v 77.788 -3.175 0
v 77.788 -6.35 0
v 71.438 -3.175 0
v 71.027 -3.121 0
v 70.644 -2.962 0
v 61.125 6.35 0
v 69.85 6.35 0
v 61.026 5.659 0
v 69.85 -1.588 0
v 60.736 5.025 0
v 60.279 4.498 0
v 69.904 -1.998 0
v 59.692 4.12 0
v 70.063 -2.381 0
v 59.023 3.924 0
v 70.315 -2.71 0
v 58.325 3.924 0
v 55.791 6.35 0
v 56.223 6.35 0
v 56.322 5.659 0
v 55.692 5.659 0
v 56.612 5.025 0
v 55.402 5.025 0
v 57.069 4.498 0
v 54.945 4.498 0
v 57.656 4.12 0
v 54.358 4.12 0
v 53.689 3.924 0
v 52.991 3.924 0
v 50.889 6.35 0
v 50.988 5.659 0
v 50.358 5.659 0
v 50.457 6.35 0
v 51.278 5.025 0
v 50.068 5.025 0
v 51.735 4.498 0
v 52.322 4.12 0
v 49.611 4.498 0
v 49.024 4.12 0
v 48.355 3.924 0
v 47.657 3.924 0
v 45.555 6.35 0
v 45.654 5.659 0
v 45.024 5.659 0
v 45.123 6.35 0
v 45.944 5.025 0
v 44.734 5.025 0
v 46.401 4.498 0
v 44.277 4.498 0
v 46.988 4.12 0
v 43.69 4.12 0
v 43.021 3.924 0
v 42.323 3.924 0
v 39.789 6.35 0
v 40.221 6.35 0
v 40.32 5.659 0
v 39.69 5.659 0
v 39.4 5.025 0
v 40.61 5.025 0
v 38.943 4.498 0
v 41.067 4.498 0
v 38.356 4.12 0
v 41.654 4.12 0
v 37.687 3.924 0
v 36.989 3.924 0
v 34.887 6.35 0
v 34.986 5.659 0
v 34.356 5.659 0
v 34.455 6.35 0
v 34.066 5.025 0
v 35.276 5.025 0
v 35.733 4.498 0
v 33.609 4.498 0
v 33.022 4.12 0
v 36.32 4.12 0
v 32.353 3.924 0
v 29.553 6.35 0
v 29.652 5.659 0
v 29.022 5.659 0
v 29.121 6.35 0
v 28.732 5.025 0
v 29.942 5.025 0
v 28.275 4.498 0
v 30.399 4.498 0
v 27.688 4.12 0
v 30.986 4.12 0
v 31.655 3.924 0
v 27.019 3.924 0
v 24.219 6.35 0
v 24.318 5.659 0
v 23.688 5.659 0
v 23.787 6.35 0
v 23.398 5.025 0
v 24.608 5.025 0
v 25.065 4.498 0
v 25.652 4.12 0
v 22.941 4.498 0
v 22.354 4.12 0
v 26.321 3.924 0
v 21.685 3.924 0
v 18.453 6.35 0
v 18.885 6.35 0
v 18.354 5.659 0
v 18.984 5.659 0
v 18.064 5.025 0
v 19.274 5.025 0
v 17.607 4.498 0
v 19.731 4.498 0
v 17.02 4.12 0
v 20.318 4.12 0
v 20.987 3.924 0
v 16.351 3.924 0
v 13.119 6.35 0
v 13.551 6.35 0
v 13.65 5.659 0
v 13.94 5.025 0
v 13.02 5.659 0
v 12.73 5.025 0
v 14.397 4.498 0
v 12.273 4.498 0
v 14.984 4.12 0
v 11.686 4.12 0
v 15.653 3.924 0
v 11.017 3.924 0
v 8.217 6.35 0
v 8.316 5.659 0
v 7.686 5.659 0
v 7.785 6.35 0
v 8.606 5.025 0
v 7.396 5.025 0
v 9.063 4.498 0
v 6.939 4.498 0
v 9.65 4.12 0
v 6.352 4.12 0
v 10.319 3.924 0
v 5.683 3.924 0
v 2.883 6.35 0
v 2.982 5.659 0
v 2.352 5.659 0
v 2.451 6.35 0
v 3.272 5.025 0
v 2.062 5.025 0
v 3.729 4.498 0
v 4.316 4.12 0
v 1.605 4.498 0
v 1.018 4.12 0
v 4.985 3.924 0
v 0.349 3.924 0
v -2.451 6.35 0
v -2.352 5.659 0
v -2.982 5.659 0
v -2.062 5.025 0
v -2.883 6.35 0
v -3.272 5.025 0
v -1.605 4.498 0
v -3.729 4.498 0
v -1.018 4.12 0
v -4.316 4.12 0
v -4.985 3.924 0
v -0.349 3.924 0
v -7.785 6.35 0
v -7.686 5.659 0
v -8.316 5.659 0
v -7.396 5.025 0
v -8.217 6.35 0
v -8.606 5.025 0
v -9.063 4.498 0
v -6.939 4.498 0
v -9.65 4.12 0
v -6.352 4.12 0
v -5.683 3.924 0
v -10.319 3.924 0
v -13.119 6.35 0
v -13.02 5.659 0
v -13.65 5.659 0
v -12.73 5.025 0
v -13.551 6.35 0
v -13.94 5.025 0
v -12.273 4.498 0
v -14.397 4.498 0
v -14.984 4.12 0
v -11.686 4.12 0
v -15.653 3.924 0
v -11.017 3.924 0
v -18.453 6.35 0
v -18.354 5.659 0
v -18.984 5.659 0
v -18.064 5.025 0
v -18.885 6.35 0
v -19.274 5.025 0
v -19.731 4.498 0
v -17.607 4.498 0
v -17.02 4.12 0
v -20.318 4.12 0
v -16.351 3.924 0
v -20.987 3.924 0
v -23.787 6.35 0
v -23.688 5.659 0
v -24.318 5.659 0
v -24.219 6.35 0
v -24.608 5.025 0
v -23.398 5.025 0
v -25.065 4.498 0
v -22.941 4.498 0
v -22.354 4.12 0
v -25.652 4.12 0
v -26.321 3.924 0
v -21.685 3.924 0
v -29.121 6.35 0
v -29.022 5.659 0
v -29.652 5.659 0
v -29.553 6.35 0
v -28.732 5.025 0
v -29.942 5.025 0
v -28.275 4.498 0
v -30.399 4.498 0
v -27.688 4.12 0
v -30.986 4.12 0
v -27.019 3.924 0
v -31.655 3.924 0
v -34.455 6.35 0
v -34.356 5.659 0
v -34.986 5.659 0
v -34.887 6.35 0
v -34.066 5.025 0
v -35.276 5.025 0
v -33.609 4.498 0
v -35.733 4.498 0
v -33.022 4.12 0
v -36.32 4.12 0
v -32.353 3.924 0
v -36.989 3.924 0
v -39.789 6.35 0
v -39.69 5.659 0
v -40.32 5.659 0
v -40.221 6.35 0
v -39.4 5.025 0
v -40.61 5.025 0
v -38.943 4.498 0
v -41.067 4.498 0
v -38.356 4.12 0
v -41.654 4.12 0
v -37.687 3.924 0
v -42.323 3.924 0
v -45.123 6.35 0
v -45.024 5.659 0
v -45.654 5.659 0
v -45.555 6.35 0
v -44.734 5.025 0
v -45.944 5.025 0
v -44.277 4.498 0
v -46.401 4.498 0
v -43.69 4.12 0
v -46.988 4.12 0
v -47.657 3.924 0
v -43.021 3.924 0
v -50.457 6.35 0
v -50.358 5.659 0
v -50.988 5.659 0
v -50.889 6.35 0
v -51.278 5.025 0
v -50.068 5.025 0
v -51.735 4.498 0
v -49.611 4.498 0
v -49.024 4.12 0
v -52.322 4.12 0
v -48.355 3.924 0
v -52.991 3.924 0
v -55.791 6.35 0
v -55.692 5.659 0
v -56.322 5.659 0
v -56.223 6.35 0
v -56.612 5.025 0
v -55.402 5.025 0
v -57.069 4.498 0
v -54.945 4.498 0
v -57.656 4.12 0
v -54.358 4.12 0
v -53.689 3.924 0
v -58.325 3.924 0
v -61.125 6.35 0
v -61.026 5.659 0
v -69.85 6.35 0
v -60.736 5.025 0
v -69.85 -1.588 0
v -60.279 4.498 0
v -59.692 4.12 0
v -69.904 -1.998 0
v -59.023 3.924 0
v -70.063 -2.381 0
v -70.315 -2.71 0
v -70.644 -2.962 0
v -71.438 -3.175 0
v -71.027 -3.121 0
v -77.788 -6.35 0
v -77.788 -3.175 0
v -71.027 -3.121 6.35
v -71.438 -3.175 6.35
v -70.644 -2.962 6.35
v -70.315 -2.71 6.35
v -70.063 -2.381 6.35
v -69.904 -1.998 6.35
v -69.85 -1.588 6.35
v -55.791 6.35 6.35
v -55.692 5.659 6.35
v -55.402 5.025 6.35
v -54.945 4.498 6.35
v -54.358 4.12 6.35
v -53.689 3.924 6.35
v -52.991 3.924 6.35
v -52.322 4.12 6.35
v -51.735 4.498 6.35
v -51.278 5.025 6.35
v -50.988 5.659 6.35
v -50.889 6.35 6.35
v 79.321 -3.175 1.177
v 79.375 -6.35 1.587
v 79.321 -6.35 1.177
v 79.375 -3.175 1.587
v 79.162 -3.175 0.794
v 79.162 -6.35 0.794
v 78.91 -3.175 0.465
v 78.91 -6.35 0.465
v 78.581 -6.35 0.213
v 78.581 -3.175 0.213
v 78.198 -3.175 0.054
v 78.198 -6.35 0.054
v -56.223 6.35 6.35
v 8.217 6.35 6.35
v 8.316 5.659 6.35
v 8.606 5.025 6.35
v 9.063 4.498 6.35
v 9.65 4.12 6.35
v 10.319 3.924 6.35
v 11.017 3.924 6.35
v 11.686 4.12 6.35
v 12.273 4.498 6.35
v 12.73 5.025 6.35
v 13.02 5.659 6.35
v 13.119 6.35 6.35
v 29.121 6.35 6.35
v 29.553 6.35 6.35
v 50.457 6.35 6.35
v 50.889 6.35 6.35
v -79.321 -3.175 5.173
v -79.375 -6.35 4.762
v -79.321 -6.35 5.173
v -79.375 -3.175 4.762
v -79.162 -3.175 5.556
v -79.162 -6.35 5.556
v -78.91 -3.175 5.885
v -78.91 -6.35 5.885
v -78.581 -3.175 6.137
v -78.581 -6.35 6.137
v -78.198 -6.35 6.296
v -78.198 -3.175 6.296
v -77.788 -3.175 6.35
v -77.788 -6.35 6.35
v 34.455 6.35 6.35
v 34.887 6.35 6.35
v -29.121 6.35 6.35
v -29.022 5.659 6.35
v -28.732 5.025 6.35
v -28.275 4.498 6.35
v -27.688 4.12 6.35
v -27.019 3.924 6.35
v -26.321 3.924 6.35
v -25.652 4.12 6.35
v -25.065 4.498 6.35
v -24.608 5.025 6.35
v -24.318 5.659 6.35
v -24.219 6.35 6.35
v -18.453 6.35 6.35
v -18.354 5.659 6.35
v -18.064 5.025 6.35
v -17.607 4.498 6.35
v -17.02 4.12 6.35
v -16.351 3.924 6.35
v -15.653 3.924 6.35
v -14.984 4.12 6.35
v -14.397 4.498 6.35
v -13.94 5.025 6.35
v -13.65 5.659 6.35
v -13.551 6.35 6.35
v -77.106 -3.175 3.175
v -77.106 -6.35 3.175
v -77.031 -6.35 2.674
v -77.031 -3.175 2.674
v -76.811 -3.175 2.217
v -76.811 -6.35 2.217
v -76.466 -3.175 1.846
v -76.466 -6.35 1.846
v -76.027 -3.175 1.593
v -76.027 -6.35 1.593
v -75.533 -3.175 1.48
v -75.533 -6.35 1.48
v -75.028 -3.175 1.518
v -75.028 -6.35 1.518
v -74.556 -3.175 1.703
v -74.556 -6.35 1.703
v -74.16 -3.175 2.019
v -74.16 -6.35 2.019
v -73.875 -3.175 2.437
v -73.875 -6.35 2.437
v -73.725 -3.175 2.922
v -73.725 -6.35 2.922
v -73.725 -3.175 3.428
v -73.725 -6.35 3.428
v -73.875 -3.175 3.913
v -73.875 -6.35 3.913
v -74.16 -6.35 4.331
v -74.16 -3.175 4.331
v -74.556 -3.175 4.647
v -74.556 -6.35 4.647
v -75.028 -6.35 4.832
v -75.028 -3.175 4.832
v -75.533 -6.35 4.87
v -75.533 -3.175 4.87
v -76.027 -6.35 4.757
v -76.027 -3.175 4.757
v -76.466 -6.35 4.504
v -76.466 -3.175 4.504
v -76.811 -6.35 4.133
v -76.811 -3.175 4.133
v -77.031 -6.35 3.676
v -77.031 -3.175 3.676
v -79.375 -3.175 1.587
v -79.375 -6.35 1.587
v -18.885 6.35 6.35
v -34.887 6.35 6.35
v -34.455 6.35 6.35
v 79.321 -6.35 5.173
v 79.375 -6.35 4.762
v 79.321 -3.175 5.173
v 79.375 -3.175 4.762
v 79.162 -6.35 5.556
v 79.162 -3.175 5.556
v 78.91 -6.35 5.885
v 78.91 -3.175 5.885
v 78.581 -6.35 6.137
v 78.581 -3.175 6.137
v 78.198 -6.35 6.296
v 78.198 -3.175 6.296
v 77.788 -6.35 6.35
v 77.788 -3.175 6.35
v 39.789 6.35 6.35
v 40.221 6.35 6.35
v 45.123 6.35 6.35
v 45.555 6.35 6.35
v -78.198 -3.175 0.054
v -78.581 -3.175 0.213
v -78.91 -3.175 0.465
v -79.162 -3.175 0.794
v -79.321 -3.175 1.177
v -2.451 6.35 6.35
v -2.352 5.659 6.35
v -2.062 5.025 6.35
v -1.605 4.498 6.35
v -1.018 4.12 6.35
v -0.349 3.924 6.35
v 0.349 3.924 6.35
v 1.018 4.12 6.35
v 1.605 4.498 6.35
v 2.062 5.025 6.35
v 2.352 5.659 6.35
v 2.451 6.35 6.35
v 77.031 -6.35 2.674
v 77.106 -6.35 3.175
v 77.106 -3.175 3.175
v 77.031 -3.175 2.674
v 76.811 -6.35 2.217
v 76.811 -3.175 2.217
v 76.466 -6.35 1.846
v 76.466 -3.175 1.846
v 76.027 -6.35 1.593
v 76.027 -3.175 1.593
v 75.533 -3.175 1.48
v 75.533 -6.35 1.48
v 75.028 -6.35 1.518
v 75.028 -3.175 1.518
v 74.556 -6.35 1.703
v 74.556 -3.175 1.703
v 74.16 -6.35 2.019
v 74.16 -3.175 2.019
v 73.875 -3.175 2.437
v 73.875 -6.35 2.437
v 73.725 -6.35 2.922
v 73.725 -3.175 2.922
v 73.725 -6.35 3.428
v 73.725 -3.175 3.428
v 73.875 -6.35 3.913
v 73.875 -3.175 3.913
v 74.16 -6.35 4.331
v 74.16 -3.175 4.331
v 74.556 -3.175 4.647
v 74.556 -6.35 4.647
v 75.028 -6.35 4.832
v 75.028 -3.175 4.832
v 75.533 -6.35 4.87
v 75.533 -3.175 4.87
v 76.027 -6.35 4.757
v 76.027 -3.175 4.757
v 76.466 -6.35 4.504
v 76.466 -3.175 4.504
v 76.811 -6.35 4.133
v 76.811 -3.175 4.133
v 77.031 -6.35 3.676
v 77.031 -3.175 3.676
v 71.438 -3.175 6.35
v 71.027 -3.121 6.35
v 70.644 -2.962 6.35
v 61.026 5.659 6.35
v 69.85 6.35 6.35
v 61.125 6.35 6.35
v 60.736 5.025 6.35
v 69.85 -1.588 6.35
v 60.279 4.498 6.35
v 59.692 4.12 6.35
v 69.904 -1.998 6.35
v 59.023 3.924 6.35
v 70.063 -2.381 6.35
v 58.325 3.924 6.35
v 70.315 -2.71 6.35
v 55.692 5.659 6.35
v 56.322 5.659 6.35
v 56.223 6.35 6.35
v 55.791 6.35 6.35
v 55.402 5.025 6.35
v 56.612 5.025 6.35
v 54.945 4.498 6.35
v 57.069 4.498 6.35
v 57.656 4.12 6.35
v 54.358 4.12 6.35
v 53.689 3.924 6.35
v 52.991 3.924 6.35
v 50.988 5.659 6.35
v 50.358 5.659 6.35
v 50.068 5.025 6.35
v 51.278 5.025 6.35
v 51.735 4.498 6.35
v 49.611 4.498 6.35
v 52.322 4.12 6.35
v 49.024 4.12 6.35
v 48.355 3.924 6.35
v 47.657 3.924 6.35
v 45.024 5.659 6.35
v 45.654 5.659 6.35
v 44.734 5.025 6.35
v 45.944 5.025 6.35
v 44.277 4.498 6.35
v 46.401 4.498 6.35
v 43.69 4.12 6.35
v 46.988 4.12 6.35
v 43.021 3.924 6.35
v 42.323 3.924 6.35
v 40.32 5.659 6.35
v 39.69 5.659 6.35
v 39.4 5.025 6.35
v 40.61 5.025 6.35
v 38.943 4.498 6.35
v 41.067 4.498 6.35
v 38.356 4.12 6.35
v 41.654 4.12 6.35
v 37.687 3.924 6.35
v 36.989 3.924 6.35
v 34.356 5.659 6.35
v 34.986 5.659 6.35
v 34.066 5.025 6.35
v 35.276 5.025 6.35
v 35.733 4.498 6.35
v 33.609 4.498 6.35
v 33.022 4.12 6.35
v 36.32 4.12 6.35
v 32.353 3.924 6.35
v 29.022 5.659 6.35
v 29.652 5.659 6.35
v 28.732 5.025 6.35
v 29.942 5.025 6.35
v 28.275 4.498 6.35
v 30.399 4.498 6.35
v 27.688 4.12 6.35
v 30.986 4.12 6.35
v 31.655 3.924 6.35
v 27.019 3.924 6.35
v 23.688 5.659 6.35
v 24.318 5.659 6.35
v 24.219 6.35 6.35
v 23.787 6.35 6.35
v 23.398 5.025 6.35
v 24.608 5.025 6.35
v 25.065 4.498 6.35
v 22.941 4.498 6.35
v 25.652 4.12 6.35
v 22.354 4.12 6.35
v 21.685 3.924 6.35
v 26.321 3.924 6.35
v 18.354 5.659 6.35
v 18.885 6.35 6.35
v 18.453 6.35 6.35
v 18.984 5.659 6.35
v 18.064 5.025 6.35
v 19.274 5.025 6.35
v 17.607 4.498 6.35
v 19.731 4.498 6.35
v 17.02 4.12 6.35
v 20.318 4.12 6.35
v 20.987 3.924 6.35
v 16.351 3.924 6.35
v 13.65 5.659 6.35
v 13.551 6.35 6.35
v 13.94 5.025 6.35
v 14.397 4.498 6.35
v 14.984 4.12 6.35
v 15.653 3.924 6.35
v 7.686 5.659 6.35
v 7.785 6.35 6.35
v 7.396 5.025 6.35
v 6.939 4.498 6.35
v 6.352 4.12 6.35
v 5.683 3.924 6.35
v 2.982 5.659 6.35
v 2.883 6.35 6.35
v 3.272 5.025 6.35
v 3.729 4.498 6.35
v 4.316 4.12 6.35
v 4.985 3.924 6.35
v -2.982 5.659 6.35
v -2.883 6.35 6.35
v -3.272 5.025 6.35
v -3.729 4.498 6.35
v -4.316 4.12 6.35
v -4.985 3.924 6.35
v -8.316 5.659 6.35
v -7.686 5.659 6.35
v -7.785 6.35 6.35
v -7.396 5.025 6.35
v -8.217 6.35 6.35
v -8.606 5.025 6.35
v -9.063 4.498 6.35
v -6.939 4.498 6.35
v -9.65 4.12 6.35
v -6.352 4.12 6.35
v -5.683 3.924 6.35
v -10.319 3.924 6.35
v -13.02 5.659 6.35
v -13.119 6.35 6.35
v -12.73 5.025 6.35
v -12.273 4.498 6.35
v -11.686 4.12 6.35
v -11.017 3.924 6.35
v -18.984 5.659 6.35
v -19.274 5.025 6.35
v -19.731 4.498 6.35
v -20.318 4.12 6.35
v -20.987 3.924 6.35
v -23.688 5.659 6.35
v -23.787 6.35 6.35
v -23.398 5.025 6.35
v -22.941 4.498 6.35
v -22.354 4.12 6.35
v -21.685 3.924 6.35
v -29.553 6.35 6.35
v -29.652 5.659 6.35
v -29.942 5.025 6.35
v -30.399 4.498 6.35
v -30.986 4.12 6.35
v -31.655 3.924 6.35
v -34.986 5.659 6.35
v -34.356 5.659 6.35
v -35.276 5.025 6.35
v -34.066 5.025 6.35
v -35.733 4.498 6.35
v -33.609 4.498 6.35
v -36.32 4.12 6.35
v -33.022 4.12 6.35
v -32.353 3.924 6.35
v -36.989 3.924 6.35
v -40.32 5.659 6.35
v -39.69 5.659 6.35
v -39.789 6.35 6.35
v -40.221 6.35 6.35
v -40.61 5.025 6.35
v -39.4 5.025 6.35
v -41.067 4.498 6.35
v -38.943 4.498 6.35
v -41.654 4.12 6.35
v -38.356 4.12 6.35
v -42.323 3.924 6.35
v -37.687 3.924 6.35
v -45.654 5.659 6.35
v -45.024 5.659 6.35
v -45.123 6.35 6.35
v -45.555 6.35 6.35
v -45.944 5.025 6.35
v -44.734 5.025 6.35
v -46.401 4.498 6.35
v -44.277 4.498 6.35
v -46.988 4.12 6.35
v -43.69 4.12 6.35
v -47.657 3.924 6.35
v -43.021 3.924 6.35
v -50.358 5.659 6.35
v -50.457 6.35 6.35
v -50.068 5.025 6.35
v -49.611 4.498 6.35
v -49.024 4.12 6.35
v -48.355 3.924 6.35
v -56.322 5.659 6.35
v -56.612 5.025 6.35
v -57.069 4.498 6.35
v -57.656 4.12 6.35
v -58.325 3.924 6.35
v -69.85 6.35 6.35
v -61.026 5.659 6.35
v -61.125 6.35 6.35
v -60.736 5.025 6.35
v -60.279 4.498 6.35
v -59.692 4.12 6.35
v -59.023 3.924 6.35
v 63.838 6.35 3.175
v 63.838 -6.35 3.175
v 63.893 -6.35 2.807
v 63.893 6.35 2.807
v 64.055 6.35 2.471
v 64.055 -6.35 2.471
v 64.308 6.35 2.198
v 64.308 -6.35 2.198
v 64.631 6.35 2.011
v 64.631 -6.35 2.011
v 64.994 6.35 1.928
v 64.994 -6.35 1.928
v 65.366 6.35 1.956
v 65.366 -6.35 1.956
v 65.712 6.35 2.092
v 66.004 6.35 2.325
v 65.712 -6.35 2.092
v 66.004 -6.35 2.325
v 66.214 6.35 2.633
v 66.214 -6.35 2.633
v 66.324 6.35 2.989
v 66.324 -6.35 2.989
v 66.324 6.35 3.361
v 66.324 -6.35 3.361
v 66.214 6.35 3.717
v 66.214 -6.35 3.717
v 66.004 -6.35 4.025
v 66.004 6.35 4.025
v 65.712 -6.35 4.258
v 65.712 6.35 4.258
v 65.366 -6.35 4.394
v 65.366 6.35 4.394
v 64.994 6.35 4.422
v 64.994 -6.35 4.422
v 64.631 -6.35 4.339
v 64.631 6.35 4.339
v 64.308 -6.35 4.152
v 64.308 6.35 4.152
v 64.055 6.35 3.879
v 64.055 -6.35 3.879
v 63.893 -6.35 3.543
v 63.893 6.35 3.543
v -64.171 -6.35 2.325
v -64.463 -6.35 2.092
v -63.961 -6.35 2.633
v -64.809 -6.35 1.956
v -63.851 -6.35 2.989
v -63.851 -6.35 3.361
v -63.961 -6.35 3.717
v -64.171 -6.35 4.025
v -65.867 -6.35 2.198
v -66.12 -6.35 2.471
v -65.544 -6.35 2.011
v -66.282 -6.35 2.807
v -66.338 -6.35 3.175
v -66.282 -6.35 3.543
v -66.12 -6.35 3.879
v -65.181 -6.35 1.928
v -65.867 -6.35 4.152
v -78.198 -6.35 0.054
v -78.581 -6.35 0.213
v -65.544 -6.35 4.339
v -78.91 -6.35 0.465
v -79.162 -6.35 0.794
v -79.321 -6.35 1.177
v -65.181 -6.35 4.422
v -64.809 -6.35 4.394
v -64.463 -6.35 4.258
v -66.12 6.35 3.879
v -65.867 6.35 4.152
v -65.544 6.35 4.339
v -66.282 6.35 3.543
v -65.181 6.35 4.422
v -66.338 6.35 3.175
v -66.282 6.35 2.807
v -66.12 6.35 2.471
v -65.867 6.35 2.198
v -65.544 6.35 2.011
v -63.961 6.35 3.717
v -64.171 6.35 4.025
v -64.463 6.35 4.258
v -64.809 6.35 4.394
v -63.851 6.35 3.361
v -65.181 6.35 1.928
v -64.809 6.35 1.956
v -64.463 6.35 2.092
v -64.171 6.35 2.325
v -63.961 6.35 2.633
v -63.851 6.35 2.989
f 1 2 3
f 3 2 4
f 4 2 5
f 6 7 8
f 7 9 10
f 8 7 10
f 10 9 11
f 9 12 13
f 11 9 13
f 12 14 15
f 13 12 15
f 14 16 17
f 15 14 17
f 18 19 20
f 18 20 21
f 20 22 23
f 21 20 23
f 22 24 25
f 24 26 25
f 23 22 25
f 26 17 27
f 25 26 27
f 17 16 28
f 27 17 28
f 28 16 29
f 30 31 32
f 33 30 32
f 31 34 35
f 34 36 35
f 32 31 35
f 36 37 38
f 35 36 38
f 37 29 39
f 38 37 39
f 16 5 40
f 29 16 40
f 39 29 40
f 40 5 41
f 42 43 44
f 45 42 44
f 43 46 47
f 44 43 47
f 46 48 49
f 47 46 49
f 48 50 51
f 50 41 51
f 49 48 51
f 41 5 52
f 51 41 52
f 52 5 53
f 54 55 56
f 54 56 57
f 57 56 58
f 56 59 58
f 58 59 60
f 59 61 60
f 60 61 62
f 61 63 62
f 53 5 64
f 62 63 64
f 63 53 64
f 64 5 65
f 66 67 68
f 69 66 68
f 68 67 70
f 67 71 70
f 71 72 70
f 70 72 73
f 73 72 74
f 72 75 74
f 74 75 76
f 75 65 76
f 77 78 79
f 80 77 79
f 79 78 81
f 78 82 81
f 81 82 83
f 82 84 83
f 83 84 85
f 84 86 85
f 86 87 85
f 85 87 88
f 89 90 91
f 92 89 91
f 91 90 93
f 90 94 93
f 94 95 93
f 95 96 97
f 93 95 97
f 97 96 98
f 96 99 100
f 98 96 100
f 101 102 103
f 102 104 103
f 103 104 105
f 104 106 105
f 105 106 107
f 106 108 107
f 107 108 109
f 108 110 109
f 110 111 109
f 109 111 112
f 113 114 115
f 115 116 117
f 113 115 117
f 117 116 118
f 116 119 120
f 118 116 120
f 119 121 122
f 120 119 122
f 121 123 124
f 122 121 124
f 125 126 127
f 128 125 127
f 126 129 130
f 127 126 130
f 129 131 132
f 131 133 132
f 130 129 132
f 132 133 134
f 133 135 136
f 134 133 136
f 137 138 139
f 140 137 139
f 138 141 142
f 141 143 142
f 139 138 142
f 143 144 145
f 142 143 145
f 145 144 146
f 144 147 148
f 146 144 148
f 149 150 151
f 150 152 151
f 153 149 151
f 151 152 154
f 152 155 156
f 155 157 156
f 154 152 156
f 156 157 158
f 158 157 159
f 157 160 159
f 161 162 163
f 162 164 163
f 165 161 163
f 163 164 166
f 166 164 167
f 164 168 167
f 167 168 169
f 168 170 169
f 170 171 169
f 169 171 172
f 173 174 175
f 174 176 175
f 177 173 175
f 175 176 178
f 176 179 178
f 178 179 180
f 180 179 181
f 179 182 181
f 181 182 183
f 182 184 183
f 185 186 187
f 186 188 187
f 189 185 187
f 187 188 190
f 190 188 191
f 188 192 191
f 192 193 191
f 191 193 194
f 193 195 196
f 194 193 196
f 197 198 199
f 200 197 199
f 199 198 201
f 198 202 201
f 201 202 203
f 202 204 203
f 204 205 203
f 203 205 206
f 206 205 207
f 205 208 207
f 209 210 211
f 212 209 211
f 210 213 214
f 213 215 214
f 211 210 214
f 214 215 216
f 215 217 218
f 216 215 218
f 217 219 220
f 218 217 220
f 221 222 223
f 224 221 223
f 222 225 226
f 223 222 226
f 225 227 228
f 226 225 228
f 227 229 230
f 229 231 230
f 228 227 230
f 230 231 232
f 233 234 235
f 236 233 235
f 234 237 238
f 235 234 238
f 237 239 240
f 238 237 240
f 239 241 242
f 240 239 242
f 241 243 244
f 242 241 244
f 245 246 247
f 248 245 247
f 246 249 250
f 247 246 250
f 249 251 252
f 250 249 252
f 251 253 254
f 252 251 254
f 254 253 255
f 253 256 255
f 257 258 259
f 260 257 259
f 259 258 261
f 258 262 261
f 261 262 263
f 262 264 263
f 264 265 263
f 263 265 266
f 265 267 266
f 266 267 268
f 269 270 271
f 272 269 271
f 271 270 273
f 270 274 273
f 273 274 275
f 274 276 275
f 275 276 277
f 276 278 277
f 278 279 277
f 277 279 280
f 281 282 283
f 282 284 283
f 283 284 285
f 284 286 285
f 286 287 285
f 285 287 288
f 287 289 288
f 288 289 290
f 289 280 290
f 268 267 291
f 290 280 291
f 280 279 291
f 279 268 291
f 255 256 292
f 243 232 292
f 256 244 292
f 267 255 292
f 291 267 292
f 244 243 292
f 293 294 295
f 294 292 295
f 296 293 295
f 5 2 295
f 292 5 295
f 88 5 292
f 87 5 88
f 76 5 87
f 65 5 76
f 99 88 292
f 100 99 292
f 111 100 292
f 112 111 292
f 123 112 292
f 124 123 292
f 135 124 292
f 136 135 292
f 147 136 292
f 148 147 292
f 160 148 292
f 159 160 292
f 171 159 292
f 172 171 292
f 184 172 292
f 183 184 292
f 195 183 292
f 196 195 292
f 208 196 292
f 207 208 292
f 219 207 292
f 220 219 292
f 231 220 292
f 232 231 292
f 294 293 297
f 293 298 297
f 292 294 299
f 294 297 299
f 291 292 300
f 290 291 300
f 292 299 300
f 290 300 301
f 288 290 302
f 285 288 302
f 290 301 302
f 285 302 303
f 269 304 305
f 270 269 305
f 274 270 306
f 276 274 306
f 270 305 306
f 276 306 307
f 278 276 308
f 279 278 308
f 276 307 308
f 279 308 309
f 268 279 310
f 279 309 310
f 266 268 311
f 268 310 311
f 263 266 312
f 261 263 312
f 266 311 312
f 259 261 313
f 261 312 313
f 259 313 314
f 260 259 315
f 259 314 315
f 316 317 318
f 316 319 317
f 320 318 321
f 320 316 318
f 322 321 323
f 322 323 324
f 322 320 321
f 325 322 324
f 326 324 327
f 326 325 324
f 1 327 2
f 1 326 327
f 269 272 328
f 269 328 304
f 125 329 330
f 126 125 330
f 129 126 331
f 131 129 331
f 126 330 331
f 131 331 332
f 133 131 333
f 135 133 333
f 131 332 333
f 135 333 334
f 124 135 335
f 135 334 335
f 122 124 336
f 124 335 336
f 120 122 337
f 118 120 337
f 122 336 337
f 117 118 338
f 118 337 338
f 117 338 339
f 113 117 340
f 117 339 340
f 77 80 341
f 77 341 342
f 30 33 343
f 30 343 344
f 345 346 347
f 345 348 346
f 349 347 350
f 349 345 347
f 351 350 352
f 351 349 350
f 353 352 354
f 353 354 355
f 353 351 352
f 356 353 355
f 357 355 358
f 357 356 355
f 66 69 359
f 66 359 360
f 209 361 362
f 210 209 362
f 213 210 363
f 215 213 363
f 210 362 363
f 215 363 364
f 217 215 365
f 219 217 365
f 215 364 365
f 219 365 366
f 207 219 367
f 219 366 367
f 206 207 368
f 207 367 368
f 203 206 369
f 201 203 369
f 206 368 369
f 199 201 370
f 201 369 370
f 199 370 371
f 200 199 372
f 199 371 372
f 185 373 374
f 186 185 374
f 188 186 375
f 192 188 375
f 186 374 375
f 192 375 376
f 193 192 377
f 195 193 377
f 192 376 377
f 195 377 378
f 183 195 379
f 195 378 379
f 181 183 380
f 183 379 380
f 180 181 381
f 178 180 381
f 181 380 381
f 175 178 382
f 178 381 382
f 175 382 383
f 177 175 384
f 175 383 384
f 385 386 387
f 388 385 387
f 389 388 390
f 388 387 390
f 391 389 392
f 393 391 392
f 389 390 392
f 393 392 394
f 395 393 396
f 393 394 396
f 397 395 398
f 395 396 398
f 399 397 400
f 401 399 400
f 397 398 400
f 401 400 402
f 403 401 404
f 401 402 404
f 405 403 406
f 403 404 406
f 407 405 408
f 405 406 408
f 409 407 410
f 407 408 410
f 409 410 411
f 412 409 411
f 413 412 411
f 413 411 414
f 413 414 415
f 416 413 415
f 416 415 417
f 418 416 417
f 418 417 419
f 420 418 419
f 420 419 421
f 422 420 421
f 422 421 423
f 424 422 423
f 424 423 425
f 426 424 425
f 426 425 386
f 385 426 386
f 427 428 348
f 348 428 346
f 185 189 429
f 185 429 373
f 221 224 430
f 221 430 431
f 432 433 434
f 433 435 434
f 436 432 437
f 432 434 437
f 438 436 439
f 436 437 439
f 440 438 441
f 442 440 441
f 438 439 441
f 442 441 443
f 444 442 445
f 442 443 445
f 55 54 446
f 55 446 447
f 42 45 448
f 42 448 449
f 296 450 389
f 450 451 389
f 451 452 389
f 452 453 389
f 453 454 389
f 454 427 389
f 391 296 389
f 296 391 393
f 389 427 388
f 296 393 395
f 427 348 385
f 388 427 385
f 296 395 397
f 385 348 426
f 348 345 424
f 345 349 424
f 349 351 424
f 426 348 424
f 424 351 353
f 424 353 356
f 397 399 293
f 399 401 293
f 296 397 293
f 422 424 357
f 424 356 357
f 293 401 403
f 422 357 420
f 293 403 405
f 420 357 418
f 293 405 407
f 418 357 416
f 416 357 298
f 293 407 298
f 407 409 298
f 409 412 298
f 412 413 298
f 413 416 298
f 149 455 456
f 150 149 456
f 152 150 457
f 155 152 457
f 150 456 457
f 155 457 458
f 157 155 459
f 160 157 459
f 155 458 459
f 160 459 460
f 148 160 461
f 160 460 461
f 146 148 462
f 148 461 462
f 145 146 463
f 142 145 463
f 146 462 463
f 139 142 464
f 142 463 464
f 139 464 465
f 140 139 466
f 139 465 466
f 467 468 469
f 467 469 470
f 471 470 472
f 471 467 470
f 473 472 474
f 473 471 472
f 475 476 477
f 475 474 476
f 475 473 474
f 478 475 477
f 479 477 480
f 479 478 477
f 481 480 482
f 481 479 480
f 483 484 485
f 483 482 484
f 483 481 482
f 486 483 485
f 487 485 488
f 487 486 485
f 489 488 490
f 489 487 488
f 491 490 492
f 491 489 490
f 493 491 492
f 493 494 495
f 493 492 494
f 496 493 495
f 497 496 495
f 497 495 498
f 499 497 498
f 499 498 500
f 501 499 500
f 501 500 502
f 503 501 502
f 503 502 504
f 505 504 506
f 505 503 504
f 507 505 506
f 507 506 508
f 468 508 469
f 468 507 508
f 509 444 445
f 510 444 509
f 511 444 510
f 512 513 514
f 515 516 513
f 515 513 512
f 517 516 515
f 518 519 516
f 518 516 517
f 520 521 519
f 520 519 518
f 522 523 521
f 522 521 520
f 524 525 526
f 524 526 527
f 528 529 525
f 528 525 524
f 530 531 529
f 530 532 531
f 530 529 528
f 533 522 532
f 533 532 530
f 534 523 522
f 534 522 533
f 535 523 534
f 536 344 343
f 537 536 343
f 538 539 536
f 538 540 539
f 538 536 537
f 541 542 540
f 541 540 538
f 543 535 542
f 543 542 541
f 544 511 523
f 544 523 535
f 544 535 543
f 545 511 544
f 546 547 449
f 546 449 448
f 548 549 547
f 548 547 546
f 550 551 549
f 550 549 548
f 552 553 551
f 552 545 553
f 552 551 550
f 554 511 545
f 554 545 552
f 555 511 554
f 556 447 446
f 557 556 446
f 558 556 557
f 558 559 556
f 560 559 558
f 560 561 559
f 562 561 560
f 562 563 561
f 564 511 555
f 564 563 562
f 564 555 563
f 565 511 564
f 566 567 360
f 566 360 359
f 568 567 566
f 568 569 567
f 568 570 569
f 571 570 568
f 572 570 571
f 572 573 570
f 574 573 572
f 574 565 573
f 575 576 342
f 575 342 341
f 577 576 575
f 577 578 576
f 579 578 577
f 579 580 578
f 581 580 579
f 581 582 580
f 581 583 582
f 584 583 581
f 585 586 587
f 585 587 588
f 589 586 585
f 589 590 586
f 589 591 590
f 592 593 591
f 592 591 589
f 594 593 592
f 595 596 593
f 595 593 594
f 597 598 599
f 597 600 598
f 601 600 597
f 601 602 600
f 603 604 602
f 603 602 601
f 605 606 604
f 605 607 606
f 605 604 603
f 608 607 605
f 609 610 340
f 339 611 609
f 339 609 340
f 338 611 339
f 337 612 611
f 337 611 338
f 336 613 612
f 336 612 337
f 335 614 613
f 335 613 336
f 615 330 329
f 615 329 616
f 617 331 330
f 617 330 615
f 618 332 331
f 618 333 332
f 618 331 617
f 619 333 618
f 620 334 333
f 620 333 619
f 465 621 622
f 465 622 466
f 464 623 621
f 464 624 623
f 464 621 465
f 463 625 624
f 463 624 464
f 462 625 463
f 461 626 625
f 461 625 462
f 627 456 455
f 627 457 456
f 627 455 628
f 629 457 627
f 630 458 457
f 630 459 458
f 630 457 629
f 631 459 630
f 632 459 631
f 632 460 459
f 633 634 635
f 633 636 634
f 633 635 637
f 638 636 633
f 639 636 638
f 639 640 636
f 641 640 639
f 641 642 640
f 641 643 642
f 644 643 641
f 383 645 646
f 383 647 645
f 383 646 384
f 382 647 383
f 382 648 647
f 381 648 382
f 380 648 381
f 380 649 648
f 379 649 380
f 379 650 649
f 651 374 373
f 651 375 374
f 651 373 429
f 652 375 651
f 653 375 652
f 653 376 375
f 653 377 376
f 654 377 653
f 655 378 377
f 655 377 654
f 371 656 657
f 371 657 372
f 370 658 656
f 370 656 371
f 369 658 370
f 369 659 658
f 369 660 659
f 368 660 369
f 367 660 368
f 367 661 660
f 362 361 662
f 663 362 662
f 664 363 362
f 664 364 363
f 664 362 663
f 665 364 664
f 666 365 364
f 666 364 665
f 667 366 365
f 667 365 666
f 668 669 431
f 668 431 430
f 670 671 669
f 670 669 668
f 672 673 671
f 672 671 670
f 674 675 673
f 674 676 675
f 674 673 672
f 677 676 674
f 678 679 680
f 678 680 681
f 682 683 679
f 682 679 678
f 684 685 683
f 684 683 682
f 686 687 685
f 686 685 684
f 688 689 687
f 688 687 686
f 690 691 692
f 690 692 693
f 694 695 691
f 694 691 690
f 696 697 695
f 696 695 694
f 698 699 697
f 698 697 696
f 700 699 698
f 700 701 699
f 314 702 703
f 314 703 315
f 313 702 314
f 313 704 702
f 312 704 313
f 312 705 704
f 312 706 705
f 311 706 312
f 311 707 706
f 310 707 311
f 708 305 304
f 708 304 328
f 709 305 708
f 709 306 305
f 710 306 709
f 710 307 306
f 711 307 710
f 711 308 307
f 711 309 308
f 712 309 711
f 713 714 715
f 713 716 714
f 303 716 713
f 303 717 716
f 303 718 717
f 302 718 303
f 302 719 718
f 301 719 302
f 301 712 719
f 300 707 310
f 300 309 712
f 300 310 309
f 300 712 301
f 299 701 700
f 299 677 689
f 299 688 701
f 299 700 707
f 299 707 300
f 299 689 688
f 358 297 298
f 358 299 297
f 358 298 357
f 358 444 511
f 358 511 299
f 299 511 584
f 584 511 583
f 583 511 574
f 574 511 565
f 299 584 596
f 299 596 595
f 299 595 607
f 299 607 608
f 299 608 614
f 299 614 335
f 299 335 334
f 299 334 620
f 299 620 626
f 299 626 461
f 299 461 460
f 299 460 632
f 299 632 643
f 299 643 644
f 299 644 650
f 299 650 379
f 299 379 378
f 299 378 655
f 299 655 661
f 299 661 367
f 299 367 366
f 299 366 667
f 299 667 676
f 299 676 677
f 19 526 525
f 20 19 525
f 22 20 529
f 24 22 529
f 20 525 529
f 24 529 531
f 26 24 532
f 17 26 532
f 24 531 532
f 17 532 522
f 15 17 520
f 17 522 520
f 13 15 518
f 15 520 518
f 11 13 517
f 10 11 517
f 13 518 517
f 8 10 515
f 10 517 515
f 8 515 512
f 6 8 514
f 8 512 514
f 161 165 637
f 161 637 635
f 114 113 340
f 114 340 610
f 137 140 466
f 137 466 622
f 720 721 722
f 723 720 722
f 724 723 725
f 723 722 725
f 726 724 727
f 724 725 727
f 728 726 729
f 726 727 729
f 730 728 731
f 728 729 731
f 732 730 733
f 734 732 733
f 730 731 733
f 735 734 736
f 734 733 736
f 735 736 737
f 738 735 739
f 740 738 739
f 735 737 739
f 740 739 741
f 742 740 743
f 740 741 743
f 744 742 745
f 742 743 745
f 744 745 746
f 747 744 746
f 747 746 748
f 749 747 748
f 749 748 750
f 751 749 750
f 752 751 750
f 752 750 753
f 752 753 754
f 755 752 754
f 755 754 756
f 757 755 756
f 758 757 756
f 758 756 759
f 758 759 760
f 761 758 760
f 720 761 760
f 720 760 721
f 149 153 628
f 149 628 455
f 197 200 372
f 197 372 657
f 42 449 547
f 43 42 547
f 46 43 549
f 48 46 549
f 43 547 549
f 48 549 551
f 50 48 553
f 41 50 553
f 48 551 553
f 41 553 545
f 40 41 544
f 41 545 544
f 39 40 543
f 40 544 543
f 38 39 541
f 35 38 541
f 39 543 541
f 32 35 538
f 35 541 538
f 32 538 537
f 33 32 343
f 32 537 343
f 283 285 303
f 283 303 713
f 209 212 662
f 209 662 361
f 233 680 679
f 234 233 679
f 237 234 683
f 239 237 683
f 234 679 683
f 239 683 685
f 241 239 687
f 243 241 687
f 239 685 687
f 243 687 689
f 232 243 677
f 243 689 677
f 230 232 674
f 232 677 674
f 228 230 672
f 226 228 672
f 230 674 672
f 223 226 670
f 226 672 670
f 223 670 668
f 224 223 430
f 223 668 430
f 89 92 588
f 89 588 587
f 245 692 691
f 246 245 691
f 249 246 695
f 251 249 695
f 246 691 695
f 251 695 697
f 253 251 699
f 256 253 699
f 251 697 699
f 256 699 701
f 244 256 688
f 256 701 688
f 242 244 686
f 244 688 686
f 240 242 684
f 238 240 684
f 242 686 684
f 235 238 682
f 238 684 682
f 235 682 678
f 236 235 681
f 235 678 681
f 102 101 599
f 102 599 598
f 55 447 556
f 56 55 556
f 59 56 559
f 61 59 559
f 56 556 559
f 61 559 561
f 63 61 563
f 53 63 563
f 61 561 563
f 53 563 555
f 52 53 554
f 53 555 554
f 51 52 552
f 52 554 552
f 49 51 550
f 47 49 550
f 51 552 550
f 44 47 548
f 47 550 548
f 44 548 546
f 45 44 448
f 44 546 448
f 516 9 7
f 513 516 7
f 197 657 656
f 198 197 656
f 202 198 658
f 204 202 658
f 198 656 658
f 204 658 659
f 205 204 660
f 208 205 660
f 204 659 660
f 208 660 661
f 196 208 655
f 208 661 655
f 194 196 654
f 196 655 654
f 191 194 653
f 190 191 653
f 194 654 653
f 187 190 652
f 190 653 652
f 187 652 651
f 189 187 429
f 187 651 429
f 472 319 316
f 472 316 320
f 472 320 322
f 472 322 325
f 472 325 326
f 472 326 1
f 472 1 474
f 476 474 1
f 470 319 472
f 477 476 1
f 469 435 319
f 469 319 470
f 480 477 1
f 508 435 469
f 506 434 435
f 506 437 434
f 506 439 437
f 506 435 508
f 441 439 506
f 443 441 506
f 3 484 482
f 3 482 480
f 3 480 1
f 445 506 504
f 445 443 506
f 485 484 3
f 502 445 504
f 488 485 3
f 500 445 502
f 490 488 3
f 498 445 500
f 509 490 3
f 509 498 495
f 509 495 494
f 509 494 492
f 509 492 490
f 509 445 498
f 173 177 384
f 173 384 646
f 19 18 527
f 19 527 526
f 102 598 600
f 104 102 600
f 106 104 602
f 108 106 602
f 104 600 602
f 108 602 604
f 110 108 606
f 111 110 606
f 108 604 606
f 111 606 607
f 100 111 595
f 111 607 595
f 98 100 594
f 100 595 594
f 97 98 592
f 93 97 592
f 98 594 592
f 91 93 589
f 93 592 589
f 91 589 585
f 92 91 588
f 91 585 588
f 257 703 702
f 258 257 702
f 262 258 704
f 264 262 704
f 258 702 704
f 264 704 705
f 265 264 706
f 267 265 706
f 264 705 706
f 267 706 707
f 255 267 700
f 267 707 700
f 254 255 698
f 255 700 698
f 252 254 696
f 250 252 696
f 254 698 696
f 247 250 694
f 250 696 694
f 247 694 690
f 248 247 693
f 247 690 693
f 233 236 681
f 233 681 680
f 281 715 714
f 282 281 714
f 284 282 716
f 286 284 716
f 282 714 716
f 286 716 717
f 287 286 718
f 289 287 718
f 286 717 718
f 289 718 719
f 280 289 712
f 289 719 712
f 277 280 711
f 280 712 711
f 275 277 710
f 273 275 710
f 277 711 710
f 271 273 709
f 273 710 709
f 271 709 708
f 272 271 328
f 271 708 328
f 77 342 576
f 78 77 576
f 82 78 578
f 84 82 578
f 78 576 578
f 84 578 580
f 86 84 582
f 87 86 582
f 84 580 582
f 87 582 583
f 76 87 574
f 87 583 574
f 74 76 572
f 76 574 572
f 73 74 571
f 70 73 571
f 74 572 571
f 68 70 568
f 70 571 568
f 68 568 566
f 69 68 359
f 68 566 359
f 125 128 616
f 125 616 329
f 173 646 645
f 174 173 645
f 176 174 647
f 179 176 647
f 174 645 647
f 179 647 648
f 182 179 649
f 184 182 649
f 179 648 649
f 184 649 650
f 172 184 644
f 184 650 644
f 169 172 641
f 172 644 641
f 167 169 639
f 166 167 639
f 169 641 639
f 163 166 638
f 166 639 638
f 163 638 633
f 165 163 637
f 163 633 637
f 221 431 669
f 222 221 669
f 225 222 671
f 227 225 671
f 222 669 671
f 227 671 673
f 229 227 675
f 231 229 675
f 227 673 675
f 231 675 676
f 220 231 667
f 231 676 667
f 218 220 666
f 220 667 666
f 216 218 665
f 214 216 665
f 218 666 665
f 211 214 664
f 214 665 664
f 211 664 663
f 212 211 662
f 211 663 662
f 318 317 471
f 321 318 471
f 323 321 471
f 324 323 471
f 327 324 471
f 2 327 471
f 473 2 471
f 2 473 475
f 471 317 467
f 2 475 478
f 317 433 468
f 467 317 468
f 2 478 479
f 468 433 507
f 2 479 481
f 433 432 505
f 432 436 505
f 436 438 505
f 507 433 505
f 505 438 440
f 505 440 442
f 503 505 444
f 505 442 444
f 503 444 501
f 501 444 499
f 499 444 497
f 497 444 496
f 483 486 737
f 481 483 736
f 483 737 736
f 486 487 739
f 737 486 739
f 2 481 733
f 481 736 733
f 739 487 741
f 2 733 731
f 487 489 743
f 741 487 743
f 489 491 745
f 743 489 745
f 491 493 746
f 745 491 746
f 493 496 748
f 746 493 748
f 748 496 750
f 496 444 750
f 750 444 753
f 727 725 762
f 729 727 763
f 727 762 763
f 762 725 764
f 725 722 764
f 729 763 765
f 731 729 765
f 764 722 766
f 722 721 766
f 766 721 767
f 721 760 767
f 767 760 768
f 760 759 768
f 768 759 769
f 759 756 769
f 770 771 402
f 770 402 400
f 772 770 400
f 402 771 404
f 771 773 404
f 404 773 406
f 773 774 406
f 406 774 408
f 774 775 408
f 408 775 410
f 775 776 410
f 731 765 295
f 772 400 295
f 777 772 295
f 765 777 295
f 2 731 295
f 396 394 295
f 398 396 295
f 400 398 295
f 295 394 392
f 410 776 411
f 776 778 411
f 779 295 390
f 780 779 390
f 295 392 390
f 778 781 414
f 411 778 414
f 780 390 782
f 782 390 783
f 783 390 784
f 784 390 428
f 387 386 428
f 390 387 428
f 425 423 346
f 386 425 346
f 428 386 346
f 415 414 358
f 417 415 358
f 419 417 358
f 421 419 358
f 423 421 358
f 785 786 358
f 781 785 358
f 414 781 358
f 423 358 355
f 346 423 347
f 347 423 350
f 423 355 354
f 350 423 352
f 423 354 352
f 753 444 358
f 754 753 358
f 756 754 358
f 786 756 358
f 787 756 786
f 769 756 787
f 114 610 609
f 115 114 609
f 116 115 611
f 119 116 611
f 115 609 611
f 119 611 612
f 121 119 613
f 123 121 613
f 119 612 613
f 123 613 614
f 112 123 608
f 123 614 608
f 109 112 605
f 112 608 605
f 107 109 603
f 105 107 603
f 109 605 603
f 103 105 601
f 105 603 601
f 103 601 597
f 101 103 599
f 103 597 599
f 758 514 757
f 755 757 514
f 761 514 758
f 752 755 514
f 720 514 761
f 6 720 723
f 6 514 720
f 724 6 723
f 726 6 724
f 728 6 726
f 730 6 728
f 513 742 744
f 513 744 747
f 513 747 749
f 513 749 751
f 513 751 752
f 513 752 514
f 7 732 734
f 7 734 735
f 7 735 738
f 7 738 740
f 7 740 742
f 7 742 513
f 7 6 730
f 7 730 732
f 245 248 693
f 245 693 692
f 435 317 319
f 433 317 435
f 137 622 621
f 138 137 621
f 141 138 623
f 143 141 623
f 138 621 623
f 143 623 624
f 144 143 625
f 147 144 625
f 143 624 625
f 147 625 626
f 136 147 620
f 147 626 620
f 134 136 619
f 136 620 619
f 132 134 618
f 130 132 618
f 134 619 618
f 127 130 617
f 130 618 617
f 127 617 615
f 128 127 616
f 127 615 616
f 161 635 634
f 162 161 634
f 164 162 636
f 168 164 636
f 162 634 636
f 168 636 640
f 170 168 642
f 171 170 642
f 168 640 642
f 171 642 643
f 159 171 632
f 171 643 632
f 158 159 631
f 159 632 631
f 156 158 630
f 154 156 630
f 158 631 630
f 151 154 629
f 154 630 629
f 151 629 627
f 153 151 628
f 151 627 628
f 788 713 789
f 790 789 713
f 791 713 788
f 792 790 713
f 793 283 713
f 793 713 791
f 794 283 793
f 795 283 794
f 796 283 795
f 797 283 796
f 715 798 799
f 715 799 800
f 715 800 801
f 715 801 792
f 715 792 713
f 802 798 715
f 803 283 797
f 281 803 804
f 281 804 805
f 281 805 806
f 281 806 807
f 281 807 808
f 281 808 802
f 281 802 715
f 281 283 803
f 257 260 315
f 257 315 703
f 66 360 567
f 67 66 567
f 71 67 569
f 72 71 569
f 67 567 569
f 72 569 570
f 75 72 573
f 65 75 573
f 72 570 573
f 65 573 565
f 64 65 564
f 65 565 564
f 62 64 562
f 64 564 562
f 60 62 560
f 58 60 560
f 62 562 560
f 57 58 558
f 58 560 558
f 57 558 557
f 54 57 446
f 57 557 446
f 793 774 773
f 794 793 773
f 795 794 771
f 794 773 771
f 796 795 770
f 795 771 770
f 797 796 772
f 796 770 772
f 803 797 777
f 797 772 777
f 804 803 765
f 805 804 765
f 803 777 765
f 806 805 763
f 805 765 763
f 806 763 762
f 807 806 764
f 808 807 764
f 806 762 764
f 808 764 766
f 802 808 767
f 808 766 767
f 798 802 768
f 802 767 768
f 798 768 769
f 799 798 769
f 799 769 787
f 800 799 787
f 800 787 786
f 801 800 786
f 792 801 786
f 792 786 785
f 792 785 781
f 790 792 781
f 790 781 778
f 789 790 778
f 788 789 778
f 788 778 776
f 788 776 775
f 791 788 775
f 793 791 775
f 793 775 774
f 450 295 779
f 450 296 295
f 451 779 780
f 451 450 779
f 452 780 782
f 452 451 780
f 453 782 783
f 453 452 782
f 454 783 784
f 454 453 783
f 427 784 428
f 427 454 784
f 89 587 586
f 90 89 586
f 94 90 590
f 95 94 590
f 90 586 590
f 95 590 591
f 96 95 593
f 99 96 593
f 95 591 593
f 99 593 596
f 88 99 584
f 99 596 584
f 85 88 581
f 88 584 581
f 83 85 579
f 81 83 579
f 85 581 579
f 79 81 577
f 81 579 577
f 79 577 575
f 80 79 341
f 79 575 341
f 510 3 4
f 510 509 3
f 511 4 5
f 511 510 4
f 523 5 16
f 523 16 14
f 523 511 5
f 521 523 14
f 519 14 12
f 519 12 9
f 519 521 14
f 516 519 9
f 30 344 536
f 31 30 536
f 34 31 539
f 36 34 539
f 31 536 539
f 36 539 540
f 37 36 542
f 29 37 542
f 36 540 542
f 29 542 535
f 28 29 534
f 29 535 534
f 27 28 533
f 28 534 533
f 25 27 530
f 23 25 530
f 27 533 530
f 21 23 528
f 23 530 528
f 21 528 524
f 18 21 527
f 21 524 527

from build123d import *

# Parameters (mm, degrees)
SKETCH1_W                   = 139.7
SKETCH1_H                   = 12.7
BOSS_EXTRUDE1_DEPTH         = 6.35
SKETCH2_R                   = 2.4511
CUT_EXTRUDE1_DEPTH          = 7.35
TAP_DRILL_FOR_M3X0_5_TAP1_D = 2.5
SKETCH5_W                   = 9.525
SKETCH5_H                   = 6.35
BOSS_EXTRUDE2_DEPTH         = 3.175
FILLET1_R                   = 1.5875
M3_CLEARANCE_HOLE1_D        = 3.4
FILLET2_R                   = 1.5875
FILLET2_OF_MIRROR5_R        = 1.5875
FILLET3_R                   = 1.5875


with BuildPart() as part:
    # Sketch1 → Boss-Extrude1 (new body)
    with BuildSketch(Plane.XY):
        Rectangle(SKETCH1_W, SKETCH1_H)
    extrude(amount=BOSS_EXTRUDE1_DEPTH)

    # Sketch2 → Cut-Extrude1 (cut, through all)
    with BuildSketch(Plane.XY.offset(6.35)):
        with Locations((0, 6.35)):
            Circle(SKETCH2_R)
        with Locations((5.334, 6.35)):
            Circle(SKETCH2_R)
        with Locations((10.668, 6.35)):
            Circle(SKETCH2_R)
        with Locations((16.002, 6.35)):
            Circle(SKETCH2_R)
        with Locations((21.336, 6.35)):
            Circle(SKETCH2_R)
        with Locations((26.67, 6.35)):
            Circle(SKETCH2_R)
        with Locations((32.004, 6.35)):
            Circle(SKETCH2_R)
        with Locations((37.338, 6.35)):
            Circle(SKETCH2_R)
        with Locations((42.672, 6.35)):
            Circle(SKETCH2_R)
        with Locations((48.006, 6.35)):
            Circle(SKETCH2_R)
        with Locations((53.34, 6.35)):
            Circle(SKETCH2_R)
        with Locations((58.674, 6.35)):
            Circle(SKETCH2_R)
        with Locations((-5.334, 6.35)):
            Circle(SKETCH2_R)
        with Locations((-10.668, 6.35)):
            Circle(SKETCH2_R)
        with Locations((-16.002, 6.35)):
            Circle(SKETCH2_R)
        with Locations((-21.336, 6.35)):
            Circle(SKETCH2_R)
        with Locations((-26.67, 6.35)):
            Circle(SKETCH2_R)
        with Locations((-32.004, 6.35)):
            Circle(SKETCH2_R)
        with Locations((-37.338, 6.35)):
            Circle(SKETCH2_R)
        with Locations((-42.672, 6.35)):
            Circle(SKETCH2_R)
        with Locations((-48.006, 6.35)):
            Circle(SKETCH2_R)
        with Locations((-53.34, 6.35)):
            Circle(SKETCH2_R)
        with Locations((-58.674, 6.35)):
            Circle(SKETCH2_R)
    extrude(amount=-CUT_EXTRUDE1_DEPTH, mode=Mode.SUBTRACT)

    # Tap Drill for M3x0.5 Tap1 (through all)
    with Locations(Plane(origin=(0, 6.35, 0), x_dir=(1, 0, 0), z_dir=(0, 1, 0))):
        with Locations((-65.0875, -3.175), (65.0875, -3.175)):
            Hole(TAP_DRILL_FOR_M3X0_5_TAP1_D / 2)

    # Sketch5 → Boss-Extrude2 (add)
    with BuildSketch(Plane.XZ.offset(6.35)):
        with Locations((-74.6125, 3.175)):
            Rectangle(SKETCH5_W, SKETCH5_H)
    boss_extrude2 = extrude(amount=-BOSS_EXTRUDE2_DEPTH)

    # Fillet1
    fillet1_edges = [part.edges().sort_by_distance(p)[0] for p in [
        (-69.85, -3.175, 3.175),
    ]]
    fillet(fillet1_edges, radius=FILLET1_R)

    # M3 Clearance Hole1 (through all)
    with Locations(Plane(origin=(0, -3.175, 0), x_dir=(1, 0, 0), z_dir=(0, 1, 0))):
        with Locations((-75.40625, -3.175)):
            m3_clearance_hole1 = Hole(M3_CLEARANCE_HOLE1_D / 2)

    # Fillet2
    fillet2_edges = [part.edges().sort_by_distance(p)[0] for p in [
        (-79.375, -4.7625, 0),
        (-79.375, -4.7625, 6.35),
    ]]
    fillet(fillet2_edges, radius=FILLET2_R)

    # Mirror5: Boss-Extrude2, M3 Clearance Hole1 across plane
    add(boss_extrude2.mirror(Plane(origin=(0, 0, 0), x_dir=(0, 0, 1), z_dir=(1, 0, 0))))
    add(m3_clearance_hole1.mirror(Plane(origin=(0, 0, 0), x_dir=(0, 0, 1), z_dir=(1, 0, 0))), mode=Mode.SUBTRACT)

    # Fillet2 of Mirror5
    fillet2_of_mirror5_edges = [part.edges().sort_by_distance(p)[0] for p in [
        (79.375, -4.7625, 0),
        (79.375, -4.7625, 6.35),
    ]]
    fillet(fillet2_of_mirror5_edges, radius=FILLET2_OF_MIRROR5_R)

    # Fillet3
    fillet3_edges = [part.edges().sort_by_distance(p)[0] for p in [
        (69.85, -3.175, 3.175),
    ]]
    fillet(fillet3_edges, radius=FILLET3_R)


solid = part.part
